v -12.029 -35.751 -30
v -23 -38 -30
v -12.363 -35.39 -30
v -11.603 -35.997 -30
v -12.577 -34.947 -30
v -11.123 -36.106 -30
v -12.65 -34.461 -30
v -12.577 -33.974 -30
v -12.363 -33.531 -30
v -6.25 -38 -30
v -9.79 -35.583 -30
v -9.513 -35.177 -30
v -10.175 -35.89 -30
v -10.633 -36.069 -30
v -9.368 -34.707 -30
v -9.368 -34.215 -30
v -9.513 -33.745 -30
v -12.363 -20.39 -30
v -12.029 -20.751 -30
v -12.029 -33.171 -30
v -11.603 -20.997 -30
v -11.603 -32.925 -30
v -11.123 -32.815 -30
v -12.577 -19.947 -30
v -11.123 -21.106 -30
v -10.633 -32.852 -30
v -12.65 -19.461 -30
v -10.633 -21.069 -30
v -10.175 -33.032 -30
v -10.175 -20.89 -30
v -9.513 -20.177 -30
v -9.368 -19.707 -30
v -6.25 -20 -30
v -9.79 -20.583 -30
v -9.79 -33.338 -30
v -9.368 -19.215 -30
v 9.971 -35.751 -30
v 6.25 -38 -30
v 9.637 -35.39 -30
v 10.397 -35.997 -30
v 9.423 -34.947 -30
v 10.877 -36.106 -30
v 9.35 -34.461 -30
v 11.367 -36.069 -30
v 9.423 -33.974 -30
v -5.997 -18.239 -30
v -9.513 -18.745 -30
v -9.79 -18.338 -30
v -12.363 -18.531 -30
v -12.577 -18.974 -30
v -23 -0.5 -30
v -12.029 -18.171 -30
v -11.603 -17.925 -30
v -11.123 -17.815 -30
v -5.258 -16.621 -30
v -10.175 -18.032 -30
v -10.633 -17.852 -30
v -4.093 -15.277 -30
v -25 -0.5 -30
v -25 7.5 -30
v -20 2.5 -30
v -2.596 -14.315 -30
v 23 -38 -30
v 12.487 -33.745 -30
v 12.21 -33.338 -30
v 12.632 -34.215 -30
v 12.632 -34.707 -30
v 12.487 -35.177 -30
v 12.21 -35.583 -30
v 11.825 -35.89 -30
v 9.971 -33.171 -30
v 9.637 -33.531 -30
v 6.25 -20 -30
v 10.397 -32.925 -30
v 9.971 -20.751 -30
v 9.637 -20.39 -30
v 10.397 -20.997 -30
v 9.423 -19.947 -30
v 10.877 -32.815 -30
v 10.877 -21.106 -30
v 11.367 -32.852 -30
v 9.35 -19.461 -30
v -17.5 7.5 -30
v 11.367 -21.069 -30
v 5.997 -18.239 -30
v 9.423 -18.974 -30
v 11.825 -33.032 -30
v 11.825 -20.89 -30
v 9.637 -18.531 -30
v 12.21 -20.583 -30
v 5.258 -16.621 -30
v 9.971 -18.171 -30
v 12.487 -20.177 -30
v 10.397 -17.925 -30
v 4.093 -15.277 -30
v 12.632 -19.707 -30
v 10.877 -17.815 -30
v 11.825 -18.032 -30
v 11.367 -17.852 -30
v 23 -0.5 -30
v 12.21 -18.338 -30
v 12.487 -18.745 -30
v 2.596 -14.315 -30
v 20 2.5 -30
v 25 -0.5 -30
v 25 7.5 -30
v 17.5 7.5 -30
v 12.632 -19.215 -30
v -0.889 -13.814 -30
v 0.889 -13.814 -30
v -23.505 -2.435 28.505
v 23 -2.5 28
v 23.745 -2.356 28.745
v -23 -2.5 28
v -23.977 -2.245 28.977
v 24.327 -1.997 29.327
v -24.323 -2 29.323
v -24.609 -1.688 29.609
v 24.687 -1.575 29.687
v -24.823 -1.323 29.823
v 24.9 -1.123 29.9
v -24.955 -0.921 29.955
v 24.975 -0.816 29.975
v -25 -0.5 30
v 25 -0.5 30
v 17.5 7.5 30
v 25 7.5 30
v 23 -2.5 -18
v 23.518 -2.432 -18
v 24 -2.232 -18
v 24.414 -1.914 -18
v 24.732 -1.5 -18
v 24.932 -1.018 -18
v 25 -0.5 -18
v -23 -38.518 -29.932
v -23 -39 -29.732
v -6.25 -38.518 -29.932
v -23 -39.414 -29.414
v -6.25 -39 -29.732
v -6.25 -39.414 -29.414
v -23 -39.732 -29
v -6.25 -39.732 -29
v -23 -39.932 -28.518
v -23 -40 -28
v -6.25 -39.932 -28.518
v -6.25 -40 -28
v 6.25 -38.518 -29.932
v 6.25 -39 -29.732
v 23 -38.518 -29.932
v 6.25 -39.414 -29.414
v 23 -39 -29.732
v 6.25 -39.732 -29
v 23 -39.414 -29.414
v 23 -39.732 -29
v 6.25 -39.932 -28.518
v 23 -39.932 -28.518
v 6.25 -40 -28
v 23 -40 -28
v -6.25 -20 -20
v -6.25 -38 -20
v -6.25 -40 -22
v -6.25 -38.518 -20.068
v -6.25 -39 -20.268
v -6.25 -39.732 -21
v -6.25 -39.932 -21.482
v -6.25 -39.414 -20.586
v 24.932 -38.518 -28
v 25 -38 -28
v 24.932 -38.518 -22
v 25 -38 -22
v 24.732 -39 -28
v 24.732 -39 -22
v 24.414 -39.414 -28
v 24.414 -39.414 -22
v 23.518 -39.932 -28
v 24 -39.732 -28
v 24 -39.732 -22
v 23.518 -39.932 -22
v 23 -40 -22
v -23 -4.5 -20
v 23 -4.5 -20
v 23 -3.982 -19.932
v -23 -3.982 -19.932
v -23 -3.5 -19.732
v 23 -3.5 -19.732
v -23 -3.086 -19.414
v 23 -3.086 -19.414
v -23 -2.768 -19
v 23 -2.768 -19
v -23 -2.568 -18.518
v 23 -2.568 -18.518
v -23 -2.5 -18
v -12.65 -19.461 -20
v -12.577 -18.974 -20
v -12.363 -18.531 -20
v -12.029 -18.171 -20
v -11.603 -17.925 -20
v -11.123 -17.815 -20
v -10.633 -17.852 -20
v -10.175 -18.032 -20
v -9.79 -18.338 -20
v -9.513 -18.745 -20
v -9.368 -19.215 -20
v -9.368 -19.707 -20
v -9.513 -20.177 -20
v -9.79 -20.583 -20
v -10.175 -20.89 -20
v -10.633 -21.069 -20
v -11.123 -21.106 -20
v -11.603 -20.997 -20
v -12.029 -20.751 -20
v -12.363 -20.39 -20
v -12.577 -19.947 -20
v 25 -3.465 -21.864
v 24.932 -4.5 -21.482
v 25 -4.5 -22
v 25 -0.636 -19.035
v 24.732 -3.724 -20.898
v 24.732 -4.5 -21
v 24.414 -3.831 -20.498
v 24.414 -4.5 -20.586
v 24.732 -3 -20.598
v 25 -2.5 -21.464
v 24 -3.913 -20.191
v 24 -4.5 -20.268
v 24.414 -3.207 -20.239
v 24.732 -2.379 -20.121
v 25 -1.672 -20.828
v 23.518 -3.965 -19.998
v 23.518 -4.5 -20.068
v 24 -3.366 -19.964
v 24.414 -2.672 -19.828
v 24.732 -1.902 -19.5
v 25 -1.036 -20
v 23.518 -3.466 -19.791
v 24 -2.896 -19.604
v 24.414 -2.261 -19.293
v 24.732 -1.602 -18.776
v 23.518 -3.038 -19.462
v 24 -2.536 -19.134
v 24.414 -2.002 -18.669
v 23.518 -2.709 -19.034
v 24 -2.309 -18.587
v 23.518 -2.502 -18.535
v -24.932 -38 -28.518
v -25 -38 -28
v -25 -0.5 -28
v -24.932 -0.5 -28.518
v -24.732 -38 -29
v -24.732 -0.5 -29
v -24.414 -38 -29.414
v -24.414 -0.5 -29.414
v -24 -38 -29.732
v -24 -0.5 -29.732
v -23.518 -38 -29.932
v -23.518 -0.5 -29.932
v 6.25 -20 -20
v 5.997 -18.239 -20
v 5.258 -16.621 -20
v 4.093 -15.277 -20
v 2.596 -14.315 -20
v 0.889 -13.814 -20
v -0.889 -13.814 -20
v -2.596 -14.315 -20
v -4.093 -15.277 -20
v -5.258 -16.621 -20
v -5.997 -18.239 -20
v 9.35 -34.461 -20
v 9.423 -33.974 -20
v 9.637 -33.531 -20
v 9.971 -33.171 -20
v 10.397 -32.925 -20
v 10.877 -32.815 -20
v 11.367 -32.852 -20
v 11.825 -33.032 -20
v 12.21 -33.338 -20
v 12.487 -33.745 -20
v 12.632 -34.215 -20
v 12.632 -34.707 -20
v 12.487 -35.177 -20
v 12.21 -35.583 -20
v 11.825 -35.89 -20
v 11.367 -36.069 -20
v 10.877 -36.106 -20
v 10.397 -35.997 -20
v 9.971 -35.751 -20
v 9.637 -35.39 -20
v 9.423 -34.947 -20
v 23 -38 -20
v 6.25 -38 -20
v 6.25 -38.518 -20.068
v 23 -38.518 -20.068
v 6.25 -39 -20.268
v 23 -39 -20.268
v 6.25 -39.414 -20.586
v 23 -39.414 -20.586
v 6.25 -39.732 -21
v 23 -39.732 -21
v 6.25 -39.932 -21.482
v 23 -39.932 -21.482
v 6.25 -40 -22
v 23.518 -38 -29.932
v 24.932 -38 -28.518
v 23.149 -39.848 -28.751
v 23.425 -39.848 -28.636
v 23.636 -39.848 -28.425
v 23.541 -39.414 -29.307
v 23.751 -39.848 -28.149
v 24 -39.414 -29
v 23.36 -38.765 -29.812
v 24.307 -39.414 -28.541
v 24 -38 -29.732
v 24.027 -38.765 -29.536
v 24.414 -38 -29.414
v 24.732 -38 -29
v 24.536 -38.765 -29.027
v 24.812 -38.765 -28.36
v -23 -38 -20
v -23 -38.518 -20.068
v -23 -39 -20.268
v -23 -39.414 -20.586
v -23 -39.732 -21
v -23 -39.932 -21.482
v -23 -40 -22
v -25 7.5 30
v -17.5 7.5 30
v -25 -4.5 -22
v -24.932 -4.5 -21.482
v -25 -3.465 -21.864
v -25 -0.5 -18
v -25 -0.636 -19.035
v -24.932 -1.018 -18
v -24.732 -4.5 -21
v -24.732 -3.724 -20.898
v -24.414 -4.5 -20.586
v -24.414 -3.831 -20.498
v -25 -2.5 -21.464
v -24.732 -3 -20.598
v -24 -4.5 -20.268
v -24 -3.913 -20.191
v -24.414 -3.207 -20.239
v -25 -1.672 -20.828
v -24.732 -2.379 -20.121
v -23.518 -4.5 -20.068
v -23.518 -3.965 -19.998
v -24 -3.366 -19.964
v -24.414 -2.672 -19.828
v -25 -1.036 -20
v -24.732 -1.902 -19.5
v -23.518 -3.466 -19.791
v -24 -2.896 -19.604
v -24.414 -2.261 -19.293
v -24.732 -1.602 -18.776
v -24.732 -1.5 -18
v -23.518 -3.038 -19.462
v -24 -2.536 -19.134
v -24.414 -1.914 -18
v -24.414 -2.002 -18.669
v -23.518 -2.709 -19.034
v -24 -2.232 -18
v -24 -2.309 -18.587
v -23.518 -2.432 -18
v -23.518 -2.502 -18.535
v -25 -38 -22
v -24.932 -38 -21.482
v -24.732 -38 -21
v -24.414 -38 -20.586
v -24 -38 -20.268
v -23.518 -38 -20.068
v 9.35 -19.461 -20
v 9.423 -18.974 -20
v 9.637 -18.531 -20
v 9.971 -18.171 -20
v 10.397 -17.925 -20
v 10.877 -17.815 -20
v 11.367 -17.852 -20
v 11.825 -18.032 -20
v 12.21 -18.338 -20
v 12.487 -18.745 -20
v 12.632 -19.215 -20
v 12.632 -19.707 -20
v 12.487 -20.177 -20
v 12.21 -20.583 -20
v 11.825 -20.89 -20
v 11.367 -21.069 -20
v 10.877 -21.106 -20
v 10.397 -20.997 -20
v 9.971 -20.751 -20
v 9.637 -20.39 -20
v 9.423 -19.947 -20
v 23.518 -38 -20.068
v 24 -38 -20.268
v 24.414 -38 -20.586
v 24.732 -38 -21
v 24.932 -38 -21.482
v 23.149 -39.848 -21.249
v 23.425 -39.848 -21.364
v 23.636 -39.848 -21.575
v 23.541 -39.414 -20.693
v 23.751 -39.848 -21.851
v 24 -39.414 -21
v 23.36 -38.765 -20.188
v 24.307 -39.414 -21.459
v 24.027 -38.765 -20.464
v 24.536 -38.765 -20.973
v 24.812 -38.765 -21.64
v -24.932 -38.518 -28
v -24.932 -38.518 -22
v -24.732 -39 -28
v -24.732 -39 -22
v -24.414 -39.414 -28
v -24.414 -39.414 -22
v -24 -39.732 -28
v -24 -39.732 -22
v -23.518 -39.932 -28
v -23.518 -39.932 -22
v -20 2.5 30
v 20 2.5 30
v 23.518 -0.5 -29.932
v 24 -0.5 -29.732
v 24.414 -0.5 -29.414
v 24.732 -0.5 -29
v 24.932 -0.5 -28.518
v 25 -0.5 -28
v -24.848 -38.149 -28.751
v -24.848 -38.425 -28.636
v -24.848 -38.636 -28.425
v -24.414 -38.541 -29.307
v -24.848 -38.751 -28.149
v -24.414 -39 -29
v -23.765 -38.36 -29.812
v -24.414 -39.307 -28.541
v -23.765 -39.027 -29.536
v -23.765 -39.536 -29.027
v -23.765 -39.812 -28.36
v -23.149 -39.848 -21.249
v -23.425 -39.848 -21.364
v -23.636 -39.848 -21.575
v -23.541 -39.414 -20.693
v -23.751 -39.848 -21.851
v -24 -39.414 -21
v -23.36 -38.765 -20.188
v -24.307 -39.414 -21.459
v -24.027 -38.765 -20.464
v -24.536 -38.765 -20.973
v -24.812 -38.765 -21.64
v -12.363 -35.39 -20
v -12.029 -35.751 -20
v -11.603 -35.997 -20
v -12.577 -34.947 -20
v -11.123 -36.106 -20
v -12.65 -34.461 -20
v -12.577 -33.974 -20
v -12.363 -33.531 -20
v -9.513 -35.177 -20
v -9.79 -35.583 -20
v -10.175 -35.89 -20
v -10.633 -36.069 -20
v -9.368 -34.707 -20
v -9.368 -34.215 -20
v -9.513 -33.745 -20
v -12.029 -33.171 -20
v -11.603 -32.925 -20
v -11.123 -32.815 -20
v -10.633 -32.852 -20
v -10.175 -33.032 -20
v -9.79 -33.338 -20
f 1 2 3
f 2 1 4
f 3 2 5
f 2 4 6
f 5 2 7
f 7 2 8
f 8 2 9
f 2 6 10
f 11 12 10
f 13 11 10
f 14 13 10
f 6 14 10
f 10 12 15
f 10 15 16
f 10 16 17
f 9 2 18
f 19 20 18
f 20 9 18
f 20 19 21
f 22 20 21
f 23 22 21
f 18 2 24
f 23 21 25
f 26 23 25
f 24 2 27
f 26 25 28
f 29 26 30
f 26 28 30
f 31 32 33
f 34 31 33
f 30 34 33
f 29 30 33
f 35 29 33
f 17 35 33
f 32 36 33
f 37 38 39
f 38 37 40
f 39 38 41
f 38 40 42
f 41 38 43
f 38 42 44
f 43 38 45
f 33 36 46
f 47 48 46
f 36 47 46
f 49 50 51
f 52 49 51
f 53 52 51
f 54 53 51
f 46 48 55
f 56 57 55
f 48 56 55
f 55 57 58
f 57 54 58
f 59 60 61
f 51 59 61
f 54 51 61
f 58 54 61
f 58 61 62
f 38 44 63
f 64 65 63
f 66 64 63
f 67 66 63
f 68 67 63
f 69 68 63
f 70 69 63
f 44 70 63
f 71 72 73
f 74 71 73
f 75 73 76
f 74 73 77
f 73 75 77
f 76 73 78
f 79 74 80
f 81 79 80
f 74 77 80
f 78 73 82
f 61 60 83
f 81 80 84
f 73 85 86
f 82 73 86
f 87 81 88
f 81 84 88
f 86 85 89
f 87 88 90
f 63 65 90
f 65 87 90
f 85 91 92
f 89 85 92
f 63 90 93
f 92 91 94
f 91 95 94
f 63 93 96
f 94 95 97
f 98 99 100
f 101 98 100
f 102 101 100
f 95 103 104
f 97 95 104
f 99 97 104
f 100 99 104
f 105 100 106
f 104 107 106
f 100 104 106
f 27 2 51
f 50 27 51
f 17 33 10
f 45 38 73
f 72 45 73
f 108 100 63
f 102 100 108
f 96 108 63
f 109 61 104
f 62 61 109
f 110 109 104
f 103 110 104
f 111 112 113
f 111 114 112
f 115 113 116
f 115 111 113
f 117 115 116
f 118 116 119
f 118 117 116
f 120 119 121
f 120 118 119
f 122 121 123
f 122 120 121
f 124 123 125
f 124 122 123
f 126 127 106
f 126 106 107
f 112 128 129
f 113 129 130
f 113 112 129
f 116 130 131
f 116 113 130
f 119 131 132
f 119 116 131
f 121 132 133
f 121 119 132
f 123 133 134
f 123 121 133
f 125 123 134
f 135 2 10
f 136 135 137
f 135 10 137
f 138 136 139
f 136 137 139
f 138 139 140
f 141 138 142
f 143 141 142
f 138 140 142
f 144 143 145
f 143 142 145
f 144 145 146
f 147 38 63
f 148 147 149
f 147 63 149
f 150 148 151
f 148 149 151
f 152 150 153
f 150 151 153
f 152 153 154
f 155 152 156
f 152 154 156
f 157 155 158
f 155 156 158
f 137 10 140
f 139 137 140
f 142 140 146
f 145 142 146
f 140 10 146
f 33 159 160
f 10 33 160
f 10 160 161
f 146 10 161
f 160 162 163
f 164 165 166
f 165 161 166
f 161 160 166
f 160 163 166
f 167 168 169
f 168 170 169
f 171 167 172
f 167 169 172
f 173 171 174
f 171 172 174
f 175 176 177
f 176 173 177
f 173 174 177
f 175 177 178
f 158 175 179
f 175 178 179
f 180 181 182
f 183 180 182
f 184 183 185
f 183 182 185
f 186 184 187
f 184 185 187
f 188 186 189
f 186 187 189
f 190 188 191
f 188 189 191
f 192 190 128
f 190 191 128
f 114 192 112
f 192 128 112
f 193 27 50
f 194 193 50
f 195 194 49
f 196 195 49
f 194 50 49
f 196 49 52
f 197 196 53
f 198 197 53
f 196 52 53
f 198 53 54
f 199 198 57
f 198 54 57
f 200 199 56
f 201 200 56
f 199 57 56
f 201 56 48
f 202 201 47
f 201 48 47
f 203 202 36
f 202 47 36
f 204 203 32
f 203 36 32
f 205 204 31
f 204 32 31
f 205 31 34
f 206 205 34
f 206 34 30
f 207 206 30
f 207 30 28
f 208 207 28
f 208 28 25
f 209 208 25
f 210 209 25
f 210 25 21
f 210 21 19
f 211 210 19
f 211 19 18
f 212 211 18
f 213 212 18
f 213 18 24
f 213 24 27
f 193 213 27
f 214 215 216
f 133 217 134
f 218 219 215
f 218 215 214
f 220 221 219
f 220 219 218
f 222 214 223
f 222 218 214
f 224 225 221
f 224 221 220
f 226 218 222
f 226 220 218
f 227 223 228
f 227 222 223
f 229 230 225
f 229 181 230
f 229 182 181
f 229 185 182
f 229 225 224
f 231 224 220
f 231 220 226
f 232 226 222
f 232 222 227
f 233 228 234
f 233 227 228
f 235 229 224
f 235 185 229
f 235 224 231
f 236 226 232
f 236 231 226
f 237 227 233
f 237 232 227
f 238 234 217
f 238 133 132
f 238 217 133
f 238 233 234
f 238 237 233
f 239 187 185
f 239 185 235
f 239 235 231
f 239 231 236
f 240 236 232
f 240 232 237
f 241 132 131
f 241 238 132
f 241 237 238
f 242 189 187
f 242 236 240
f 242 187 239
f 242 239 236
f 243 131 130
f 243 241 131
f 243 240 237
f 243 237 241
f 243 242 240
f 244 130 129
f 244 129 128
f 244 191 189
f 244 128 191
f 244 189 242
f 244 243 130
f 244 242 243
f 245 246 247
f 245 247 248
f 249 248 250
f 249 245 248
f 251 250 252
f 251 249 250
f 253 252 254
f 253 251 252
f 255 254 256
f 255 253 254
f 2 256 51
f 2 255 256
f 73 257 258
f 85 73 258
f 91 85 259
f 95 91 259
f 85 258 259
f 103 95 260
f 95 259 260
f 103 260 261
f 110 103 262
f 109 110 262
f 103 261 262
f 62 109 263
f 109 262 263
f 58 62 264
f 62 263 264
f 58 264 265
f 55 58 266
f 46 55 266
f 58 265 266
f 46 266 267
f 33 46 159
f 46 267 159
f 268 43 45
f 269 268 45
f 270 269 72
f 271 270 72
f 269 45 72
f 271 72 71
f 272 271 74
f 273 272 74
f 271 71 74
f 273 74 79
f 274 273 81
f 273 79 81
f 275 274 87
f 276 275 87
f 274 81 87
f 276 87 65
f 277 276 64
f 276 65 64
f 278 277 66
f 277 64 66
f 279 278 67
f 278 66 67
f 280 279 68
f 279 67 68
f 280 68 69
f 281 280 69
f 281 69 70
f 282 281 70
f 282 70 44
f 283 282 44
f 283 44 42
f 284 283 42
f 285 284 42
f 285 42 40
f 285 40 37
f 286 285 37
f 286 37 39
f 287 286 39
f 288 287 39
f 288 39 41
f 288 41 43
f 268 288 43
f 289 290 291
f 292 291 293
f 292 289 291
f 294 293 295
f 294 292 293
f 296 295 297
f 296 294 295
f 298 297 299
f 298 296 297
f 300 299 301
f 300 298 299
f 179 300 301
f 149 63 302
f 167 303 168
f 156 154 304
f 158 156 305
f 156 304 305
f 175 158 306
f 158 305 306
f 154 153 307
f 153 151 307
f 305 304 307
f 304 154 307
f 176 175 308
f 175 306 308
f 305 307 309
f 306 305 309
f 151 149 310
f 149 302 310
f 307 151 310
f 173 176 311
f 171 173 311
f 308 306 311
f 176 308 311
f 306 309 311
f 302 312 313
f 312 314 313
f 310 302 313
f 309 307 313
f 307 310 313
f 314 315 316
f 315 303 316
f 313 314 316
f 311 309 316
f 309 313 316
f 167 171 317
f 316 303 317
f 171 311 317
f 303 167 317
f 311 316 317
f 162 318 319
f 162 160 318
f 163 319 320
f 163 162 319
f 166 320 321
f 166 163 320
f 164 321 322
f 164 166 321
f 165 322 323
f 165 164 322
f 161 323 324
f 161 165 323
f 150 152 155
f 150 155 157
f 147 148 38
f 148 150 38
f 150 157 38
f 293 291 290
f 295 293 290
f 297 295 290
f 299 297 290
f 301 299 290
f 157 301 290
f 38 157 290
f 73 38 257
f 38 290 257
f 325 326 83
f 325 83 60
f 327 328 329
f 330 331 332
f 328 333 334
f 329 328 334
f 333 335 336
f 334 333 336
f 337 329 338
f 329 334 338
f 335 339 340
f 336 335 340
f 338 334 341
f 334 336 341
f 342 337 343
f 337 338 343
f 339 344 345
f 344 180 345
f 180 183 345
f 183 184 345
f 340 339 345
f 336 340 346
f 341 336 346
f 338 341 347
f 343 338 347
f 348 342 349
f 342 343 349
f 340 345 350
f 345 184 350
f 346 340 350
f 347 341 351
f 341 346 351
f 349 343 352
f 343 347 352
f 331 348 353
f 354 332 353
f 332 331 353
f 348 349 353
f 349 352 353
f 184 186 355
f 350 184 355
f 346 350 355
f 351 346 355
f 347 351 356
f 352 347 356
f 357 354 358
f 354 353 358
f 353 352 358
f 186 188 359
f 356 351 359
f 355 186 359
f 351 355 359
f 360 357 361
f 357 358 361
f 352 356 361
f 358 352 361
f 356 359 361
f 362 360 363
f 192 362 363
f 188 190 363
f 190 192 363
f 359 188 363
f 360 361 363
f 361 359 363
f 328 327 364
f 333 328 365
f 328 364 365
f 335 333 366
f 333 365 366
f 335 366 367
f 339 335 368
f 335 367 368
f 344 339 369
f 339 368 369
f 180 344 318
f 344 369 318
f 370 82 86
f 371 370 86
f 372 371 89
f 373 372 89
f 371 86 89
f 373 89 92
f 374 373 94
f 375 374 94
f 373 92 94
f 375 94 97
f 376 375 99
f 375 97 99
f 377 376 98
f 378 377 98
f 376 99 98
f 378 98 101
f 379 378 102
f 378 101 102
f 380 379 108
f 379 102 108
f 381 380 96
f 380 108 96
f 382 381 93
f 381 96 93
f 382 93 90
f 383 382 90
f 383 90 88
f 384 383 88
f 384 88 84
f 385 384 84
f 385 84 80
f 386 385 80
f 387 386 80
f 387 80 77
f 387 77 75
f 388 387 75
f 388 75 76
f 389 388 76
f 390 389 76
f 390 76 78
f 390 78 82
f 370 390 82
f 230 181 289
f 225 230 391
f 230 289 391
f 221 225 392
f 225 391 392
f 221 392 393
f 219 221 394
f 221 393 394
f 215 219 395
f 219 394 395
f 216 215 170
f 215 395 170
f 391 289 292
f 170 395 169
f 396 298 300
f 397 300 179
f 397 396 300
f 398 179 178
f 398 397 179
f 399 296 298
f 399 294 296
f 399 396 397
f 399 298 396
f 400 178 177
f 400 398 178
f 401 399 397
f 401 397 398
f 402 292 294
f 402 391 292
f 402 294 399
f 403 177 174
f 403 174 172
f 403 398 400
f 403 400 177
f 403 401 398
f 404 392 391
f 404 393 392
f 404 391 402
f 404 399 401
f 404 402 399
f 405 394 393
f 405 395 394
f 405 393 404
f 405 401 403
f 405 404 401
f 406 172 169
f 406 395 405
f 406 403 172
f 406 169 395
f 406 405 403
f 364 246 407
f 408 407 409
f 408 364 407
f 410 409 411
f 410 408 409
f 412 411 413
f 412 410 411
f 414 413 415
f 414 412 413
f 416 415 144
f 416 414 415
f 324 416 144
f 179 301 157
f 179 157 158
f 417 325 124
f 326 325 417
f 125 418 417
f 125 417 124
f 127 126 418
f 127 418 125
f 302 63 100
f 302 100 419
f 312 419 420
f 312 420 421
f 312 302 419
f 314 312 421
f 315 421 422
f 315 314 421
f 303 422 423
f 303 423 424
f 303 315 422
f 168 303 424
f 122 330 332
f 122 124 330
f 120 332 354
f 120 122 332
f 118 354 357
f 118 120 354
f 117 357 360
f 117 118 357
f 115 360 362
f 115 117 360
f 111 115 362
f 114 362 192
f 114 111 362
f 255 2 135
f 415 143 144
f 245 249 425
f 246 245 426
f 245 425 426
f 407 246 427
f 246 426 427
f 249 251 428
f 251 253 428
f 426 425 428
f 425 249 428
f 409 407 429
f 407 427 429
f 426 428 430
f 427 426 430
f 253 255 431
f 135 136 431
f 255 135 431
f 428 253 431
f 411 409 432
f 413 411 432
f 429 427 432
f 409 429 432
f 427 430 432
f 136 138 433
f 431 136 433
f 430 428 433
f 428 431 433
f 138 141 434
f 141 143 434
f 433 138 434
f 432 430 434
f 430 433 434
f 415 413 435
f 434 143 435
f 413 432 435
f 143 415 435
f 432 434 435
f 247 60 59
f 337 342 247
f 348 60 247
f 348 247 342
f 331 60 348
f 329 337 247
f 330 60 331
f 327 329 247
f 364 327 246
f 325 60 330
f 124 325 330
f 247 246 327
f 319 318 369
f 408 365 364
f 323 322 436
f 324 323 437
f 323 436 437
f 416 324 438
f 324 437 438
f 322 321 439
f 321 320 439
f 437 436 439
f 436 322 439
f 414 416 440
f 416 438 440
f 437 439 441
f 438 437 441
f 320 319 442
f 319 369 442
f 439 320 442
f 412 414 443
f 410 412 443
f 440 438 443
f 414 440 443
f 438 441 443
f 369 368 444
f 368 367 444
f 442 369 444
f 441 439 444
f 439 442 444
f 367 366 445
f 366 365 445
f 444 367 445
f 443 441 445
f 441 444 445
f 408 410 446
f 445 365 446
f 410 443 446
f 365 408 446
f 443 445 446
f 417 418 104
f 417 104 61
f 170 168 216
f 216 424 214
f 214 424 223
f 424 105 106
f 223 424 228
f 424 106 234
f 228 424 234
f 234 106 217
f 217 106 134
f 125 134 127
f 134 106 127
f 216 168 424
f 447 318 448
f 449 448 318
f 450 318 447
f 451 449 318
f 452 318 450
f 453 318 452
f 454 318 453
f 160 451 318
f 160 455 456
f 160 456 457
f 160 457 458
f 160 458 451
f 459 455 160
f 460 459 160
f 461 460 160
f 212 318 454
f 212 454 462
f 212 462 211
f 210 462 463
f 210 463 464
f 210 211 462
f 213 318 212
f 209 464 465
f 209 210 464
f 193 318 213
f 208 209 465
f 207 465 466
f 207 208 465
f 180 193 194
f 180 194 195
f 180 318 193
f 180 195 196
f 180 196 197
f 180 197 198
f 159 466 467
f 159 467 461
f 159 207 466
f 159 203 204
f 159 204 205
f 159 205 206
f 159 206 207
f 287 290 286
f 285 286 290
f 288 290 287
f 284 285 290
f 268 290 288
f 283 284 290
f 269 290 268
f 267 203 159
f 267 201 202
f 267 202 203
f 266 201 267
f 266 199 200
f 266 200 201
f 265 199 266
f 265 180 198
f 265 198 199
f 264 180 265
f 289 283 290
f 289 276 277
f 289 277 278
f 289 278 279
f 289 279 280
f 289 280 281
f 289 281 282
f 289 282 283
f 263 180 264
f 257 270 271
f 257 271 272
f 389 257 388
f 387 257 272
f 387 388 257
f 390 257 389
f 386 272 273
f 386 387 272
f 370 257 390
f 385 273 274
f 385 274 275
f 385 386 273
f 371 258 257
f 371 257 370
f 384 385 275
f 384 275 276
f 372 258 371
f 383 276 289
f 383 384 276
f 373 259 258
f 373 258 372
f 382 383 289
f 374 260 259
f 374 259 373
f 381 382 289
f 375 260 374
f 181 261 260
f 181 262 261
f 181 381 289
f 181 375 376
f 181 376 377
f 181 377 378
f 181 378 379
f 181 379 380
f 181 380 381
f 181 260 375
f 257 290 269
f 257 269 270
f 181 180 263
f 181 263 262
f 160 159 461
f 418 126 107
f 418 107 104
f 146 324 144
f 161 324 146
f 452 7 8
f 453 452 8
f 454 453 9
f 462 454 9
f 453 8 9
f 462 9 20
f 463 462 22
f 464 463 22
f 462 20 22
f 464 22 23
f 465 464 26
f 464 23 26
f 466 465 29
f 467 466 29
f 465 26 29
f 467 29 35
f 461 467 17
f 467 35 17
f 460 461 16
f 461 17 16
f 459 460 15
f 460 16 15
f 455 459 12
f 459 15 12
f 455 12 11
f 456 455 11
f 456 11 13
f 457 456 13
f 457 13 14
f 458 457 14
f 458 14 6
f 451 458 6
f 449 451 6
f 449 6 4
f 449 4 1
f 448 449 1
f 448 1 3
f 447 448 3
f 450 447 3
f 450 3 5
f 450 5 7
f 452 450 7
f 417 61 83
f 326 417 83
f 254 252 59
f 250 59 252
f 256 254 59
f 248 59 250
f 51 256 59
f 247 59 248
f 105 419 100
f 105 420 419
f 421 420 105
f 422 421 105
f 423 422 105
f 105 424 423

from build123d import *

# Parameters (mm, degrees)
F0_W          = 5
F0_H          = 60
F1_DEPTH      = 25
F1_DEPTH_BACK = 25
F2_W          = 50
F2_H          = 10
F3_DEPTH      = 40
F5_DEPTH      = 25
F6_R          = 2
F8_D          = 3.3
F10_DEPTH     = 60


with BuildPart() as f1:
    # F0 (on Right) → F1 (new body, two sides)
    with BuildSketch(Plane.YZ) as f1_sk:
        Rectangle(F0_W, F0_H)
    extrude(amount=F1_DEPTH)
    extrude(f1_sk.sketch, amount=-F1_DEPTH_BACK)

    # F2 (on Front) → F3 (join)
    with BuildSketch(Plane.XZ):
        with Locations((0, -25)):
            Rectangle(F2_W, F2_H)
    extrude(amount=F3_DEPTH)

    # F4 (on face) → F5 (cut)
    with BuildSketch(Plane.XY.offset(-20)):
        with BuildLine():
            ThreePointArc((6.25, -20), (0, -26.25), (-6.25, -20))
            Line((-6.25, -20), (-6.25, -40))
            Line((-6.25, -40), (6.25, -40))
            Line((6.25, -40), (6.25, -20))
        make_face()
        with BuildLine():
            ThreePointArc((6.25, -20), (0, -13.75), (-6.25, -20))
            ThreePointArc((-6.25, -20), (0, -26.25), (6.25, -20))
        make_face()
    extrude(amount=-F5_DEPTH, mode=Mode.SUBTRACT)

    # F6
    f6_edges = [f1.edges().sort_by_distance(p)[0] for p in [
        (-25, -21.25, -20),
        (-25, -2.5, 5),
        (25, -21.25, -20),
        (25, -2.5, 5),
        (-15.625, -40, -20),
        (15.625, -40, -20),
        (-15.625, -40, -30),
        (-25, -18.75, -30),
        (25, -18.75, -30),
        (15.625, -40, -30),
        (25, -40, -25),
        (-25, -40, -25),
        (0, -2.5, 30),
        (0, -2.5, -20),
    ]]
    fillet(f6_edges, radius=F6_R)

    # F8 (through all)
    with Locations(Plane.XY.offset(-20)):
        with Locations((-11, -19.460708499), (11, -19.460708499), (11, -34.460708499), (-11, -34.460708499)):
            Hole(F8_D / 2)

    # F9 (on face) → F10 (join)
    with BuildSketch(Plane.XY.offset(30)):
        Polygon((-25, 7.5), (-25, -0.5), (25, -0.5), (25, 7.5), (17.5, 7.5), (20, 2.5), (-20, 2.5), (-17.5, 7.5), align=None)
    extrude(amount=-F10_DEPTH)


solid = f1.part
